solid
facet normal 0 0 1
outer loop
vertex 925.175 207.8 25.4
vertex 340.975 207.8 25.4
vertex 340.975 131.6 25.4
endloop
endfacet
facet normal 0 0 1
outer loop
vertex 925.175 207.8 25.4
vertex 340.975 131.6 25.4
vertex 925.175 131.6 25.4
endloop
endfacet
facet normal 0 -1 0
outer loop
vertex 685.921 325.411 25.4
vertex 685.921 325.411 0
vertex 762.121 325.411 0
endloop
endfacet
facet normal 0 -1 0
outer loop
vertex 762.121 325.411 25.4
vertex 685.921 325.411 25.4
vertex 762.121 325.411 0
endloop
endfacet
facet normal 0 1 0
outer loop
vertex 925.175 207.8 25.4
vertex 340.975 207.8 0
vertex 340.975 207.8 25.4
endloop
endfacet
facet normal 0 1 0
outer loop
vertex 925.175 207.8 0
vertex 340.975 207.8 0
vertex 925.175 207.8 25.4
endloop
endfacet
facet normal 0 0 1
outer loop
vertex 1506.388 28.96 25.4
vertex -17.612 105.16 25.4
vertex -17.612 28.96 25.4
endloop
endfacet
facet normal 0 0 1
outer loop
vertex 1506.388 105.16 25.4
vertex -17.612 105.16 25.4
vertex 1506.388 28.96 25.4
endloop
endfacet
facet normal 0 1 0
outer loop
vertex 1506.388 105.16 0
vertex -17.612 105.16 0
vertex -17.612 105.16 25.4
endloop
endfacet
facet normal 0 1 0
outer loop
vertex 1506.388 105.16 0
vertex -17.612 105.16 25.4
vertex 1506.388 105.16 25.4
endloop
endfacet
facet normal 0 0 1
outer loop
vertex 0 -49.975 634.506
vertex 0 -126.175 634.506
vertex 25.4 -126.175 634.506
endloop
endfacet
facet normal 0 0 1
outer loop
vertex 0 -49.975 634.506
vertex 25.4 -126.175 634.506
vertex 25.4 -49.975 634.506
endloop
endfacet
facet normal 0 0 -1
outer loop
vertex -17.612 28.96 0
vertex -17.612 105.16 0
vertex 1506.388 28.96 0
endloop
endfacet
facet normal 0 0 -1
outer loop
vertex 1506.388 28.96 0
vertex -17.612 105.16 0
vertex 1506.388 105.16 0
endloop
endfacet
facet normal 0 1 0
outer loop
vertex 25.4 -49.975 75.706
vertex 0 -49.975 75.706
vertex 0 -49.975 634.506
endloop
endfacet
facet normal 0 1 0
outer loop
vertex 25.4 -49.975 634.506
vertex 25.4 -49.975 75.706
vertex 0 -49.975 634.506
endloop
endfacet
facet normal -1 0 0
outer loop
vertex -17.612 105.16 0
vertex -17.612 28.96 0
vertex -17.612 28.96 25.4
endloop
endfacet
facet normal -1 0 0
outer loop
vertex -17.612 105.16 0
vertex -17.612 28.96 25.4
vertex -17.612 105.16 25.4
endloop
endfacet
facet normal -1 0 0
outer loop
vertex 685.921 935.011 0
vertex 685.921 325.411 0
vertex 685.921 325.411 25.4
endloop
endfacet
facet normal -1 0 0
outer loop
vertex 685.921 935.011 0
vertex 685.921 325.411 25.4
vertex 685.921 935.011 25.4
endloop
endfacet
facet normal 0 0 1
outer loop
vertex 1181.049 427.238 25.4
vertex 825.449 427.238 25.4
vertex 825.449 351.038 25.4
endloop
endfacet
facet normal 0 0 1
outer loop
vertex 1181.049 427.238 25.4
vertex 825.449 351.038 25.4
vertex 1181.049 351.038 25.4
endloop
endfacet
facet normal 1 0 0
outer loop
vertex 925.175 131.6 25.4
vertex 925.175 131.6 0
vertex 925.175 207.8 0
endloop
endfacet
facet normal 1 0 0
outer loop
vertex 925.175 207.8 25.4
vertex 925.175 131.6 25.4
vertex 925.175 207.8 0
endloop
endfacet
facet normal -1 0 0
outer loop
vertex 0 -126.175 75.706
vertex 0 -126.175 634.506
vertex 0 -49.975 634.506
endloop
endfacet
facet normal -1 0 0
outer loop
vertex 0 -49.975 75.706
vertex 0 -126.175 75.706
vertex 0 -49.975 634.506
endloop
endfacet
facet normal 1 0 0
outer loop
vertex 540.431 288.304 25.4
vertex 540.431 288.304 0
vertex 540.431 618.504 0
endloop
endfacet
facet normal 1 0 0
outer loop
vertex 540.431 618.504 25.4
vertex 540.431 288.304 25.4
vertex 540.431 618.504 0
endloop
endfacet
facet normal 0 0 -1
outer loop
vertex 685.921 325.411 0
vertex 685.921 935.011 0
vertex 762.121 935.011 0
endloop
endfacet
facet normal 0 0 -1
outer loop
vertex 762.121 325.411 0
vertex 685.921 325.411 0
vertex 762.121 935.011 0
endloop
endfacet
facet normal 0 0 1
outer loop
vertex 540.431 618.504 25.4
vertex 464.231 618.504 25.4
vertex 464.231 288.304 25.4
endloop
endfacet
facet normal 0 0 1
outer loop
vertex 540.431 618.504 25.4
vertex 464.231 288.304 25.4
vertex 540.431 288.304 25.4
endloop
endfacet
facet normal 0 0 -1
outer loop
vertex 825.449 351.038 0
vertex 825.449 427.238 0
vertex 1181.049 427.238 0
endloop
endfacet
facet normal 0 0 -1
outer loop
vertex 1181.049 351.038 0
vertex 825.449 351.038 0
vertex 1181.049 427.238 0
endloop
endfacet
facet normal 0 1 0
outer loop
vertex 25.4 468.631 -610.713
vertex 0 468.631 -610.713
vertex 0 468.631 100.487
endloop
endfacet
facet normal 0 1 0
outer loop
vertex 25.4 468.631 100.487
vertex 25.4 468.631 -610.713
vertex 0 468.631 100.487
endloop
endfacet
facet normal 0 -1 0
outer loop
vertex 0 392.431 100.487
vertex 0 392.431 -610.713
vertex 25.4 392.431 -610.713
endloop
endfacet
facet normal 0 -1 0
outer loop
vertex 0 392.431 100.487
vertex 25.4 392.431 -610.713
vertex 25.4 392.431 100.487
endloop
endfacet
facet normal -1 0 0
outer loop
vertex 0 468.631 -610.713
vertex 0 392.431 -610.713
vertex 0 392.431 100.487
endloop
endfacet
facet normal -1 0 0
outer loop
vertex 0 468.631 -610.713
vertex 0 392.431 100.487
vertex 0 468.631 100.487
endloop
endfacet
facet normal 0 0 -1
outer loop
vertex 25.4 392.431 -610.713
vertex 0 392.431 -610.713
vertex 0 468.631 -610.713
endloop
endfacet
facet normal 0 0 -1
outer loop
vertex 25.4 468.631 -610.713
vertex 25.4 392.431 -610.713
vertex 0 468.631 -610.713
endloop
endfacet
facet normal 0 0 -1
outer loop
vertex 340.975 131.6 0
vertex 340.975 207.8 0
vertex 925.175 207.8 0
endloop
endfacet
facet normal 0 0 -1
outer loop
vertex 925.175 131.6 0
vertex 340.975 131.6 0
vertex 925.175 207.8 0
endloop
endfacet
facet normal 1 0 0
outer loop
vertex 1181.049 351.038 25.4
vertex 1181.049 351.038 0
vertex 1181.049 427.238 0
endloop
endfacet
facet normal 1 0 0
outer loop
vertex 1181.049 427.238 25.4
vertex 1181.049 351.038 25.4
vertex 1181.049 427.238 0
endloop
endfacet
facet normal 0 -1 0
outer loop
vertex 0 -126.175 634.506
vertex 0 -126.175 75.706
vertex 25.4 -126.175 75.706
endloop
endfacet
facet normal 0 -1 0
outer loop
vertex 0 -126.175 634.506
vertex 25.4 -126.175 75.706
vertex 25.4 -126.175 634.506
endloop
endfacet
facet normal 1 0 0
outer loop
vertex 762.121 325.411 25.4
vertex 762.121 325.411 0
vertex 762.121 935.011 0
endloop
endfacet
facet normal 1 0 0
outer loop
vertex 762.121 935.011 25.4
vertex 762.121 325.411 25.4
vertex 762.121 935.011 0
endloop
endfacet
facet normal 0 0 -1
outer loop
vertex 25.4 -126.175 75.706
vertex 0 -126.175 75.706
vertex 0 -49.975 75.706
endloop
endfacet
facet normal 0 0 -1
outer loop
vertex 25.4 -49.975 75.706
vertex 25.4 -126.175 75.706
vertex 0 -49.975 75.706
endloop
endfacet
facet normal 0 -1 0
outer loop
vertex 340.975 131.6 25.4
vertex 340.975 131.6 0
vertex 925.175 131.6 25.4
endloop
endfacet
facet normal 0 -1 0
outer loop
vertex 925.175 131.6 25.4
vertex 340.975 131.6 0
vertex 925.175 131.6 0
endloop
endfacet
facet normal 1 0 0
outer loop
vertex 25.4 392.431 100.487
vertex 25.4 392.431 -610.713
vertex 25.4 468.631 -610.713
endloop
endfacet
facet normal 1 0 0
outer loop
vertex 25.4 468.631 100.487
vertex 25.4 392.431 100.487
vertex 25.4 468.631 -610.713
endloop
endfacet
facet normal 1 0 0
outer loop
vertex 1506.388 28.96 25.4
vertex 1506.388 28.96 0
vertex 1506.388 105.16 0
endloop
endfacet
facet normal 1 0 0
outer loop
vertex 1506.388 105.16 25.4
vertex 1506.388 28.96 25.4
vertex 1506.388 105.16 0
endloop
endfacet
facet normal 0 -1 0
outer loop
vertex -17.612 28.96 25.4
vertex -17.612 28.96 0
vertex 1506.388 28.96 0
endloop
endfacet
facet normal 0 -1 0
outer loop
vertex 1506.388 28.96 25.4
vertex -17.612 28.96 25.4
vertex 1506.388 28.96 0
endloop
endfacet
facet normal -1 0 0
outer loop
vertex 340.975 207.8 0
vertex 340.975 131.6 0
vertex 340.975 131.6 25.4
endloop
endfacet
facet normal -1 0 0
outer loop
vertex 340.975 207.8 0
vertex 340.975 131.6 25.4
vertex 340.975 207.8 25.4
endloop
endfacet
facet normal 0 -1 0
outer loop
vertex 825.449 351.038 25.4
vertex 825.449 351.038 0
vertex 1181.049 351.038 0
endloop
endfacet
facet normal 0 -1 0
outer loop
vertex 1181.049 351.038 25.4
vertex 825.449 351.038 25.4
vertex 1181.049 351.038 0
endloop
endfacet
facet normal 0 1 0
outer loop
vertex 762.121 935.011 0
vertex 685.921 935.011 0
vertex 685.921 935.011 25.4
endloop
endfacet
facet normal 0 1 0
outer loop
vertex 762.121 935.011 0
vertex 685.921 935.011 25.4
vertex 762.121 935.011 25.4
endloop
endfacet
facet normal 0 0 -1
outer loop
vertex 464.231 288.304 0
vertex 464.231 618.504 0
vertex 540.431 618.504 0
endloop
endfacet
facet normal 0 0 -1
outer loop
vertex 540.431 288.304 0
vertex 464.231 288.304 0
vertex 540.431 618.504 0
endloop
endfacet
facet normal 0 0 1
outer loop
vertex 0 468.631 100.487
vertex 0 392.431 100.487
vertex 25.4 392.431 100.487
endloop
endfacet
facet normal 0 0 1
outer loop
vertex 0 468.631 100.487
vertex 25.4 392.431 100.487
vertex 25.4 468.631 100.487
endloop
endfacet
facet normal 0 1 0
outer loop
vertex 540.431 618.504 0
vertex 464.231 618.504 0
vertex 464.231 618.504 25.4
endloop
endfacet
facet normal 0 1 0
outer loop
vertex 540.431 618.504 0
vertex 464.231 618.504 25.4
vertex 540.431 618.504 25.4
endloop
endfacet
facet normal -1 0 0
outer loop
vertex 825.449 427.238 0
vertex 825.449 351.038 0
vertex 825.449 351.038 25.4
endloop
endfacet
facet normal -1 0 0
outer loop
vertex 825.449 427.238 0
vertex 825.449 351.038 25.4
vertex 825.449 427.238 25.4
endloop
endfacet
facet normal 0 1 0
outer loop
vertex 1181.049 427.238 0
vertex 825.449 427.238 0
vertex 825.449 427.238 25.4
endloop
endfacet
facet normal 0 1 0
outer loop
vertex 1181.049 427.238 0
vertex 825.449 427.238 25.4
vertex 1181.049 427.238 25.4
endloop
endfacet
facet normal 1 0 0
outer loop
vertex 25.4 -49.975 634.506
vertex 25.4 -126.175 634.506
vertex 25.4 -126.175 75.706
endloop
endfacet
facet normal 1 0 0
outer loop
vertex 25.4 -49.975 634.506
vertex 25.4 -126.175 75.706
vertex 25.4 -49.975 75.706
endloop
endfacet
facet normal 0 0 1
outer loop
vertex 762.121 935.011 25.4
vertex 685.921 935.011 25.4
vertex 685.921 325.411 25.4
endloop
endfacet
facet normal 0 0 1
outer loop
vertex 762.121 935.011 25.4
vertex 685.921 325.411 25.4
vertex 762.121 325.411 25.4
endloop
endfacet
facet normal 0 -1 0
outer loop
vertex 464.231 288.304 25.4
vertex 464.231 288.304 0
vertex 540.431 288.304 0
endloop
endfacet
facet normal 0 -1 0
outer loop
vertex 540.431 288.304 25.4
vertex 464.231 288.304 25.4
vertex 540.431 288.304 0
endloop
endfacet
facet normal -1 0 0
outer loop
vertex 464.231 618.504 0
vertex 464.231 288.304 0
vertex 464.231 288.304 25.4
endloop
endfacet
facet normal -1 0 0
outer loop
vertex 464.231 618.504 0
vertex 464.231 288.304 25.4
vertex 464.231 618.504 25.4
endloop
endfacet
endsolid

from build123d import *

# Parameters (mm, degrees)
F0_W      = 1524
F0_H      = 76.2
F1_DEPTH  = 25.4
F2_W      = 76.2
F2_H      = 711.2
F3_DEPTH  = 25.4
F4_W      = 76.2
F4_H      = 558.8
F5_DEPTH  = 25.4
F6_W      = 76.2
F6_H      = 330.2
F7_DEPTH  = 25.4
F8_W      = 584.2
F8_H      = 76.2
F9_DEPTH  = 25.4
F10_W     = 76.2
F10_H     = 609.6
F11_DEPTH = 25.4
F12_W     = 355.6
F12_H     = 76.2
F13_DEPTH = 25.4


with BuildPart() as f1:
    # F0 (on Top) → F1 (new body)
    with BuildSketch(Plane.XY):
        with Locations((744.387708, 67.060482)):
            Rectangle(F0_W, F0_H)
    extrude(amount=F1_DEPTH)


with BuildPart() as f3:
    # F2 (on Right) → F3 (new body)
    with BuildSketch(Plane.YZ):
        with Locations((430.530787, -255.1134)):
            Rectangle(F2_W, F2_H)
    extrude(amount=F3_DEPTH)


with BuildPart() as f5:
    # F4 (on Right) → F5 (new body)
    with BuildSketch(Plane.YZ):
        with Locations((-88.074505, 355.106401)):
            Rectangle(F4_W, F4_H)
    extrude(amount=F5_DEPTH)


with BuildPart() as f7:
    # F6 (on Top) → F7 (new body)
    with BuildSketch(Plane.XY):
        with Locations((502.330919, 453.40395)):
            Rectangle(F6_W, F6_H)
    extrude(amount=F7_DEPTH)


with BuildPart() as f9:
    # F8 (on Top) → F9 (new body)
    with BuildSketch(Plane.XY):
        with Locations((633.075207, 169.699594)):
            Rectangle(F8_W, F8_H)
    extrude(amount=F9_DEPTH)


with BuildPart() as f11:
    # F10 (on Top) → F11 (new body)
    with BuildSketch(Plane.XY):
        with Locations((724.020928, 630.211345)):
            Rectangle(F10_W, F10_H)
    extrude(amount=F11_DEPTH)


with BuildPart() as f13:
    # F12 (on Top) → F13 (new body)
    with BuildSketch(Plane.XY):
        with Locations((1003.24887, 389.137766)):
            Rectangle(F12_W, F12_H)
    extrude(amount=F13_DEPTH)


solid = Compound([f1.part, f3.part, f5.part, f7.part, f9.part, f11.part, f13.part])
